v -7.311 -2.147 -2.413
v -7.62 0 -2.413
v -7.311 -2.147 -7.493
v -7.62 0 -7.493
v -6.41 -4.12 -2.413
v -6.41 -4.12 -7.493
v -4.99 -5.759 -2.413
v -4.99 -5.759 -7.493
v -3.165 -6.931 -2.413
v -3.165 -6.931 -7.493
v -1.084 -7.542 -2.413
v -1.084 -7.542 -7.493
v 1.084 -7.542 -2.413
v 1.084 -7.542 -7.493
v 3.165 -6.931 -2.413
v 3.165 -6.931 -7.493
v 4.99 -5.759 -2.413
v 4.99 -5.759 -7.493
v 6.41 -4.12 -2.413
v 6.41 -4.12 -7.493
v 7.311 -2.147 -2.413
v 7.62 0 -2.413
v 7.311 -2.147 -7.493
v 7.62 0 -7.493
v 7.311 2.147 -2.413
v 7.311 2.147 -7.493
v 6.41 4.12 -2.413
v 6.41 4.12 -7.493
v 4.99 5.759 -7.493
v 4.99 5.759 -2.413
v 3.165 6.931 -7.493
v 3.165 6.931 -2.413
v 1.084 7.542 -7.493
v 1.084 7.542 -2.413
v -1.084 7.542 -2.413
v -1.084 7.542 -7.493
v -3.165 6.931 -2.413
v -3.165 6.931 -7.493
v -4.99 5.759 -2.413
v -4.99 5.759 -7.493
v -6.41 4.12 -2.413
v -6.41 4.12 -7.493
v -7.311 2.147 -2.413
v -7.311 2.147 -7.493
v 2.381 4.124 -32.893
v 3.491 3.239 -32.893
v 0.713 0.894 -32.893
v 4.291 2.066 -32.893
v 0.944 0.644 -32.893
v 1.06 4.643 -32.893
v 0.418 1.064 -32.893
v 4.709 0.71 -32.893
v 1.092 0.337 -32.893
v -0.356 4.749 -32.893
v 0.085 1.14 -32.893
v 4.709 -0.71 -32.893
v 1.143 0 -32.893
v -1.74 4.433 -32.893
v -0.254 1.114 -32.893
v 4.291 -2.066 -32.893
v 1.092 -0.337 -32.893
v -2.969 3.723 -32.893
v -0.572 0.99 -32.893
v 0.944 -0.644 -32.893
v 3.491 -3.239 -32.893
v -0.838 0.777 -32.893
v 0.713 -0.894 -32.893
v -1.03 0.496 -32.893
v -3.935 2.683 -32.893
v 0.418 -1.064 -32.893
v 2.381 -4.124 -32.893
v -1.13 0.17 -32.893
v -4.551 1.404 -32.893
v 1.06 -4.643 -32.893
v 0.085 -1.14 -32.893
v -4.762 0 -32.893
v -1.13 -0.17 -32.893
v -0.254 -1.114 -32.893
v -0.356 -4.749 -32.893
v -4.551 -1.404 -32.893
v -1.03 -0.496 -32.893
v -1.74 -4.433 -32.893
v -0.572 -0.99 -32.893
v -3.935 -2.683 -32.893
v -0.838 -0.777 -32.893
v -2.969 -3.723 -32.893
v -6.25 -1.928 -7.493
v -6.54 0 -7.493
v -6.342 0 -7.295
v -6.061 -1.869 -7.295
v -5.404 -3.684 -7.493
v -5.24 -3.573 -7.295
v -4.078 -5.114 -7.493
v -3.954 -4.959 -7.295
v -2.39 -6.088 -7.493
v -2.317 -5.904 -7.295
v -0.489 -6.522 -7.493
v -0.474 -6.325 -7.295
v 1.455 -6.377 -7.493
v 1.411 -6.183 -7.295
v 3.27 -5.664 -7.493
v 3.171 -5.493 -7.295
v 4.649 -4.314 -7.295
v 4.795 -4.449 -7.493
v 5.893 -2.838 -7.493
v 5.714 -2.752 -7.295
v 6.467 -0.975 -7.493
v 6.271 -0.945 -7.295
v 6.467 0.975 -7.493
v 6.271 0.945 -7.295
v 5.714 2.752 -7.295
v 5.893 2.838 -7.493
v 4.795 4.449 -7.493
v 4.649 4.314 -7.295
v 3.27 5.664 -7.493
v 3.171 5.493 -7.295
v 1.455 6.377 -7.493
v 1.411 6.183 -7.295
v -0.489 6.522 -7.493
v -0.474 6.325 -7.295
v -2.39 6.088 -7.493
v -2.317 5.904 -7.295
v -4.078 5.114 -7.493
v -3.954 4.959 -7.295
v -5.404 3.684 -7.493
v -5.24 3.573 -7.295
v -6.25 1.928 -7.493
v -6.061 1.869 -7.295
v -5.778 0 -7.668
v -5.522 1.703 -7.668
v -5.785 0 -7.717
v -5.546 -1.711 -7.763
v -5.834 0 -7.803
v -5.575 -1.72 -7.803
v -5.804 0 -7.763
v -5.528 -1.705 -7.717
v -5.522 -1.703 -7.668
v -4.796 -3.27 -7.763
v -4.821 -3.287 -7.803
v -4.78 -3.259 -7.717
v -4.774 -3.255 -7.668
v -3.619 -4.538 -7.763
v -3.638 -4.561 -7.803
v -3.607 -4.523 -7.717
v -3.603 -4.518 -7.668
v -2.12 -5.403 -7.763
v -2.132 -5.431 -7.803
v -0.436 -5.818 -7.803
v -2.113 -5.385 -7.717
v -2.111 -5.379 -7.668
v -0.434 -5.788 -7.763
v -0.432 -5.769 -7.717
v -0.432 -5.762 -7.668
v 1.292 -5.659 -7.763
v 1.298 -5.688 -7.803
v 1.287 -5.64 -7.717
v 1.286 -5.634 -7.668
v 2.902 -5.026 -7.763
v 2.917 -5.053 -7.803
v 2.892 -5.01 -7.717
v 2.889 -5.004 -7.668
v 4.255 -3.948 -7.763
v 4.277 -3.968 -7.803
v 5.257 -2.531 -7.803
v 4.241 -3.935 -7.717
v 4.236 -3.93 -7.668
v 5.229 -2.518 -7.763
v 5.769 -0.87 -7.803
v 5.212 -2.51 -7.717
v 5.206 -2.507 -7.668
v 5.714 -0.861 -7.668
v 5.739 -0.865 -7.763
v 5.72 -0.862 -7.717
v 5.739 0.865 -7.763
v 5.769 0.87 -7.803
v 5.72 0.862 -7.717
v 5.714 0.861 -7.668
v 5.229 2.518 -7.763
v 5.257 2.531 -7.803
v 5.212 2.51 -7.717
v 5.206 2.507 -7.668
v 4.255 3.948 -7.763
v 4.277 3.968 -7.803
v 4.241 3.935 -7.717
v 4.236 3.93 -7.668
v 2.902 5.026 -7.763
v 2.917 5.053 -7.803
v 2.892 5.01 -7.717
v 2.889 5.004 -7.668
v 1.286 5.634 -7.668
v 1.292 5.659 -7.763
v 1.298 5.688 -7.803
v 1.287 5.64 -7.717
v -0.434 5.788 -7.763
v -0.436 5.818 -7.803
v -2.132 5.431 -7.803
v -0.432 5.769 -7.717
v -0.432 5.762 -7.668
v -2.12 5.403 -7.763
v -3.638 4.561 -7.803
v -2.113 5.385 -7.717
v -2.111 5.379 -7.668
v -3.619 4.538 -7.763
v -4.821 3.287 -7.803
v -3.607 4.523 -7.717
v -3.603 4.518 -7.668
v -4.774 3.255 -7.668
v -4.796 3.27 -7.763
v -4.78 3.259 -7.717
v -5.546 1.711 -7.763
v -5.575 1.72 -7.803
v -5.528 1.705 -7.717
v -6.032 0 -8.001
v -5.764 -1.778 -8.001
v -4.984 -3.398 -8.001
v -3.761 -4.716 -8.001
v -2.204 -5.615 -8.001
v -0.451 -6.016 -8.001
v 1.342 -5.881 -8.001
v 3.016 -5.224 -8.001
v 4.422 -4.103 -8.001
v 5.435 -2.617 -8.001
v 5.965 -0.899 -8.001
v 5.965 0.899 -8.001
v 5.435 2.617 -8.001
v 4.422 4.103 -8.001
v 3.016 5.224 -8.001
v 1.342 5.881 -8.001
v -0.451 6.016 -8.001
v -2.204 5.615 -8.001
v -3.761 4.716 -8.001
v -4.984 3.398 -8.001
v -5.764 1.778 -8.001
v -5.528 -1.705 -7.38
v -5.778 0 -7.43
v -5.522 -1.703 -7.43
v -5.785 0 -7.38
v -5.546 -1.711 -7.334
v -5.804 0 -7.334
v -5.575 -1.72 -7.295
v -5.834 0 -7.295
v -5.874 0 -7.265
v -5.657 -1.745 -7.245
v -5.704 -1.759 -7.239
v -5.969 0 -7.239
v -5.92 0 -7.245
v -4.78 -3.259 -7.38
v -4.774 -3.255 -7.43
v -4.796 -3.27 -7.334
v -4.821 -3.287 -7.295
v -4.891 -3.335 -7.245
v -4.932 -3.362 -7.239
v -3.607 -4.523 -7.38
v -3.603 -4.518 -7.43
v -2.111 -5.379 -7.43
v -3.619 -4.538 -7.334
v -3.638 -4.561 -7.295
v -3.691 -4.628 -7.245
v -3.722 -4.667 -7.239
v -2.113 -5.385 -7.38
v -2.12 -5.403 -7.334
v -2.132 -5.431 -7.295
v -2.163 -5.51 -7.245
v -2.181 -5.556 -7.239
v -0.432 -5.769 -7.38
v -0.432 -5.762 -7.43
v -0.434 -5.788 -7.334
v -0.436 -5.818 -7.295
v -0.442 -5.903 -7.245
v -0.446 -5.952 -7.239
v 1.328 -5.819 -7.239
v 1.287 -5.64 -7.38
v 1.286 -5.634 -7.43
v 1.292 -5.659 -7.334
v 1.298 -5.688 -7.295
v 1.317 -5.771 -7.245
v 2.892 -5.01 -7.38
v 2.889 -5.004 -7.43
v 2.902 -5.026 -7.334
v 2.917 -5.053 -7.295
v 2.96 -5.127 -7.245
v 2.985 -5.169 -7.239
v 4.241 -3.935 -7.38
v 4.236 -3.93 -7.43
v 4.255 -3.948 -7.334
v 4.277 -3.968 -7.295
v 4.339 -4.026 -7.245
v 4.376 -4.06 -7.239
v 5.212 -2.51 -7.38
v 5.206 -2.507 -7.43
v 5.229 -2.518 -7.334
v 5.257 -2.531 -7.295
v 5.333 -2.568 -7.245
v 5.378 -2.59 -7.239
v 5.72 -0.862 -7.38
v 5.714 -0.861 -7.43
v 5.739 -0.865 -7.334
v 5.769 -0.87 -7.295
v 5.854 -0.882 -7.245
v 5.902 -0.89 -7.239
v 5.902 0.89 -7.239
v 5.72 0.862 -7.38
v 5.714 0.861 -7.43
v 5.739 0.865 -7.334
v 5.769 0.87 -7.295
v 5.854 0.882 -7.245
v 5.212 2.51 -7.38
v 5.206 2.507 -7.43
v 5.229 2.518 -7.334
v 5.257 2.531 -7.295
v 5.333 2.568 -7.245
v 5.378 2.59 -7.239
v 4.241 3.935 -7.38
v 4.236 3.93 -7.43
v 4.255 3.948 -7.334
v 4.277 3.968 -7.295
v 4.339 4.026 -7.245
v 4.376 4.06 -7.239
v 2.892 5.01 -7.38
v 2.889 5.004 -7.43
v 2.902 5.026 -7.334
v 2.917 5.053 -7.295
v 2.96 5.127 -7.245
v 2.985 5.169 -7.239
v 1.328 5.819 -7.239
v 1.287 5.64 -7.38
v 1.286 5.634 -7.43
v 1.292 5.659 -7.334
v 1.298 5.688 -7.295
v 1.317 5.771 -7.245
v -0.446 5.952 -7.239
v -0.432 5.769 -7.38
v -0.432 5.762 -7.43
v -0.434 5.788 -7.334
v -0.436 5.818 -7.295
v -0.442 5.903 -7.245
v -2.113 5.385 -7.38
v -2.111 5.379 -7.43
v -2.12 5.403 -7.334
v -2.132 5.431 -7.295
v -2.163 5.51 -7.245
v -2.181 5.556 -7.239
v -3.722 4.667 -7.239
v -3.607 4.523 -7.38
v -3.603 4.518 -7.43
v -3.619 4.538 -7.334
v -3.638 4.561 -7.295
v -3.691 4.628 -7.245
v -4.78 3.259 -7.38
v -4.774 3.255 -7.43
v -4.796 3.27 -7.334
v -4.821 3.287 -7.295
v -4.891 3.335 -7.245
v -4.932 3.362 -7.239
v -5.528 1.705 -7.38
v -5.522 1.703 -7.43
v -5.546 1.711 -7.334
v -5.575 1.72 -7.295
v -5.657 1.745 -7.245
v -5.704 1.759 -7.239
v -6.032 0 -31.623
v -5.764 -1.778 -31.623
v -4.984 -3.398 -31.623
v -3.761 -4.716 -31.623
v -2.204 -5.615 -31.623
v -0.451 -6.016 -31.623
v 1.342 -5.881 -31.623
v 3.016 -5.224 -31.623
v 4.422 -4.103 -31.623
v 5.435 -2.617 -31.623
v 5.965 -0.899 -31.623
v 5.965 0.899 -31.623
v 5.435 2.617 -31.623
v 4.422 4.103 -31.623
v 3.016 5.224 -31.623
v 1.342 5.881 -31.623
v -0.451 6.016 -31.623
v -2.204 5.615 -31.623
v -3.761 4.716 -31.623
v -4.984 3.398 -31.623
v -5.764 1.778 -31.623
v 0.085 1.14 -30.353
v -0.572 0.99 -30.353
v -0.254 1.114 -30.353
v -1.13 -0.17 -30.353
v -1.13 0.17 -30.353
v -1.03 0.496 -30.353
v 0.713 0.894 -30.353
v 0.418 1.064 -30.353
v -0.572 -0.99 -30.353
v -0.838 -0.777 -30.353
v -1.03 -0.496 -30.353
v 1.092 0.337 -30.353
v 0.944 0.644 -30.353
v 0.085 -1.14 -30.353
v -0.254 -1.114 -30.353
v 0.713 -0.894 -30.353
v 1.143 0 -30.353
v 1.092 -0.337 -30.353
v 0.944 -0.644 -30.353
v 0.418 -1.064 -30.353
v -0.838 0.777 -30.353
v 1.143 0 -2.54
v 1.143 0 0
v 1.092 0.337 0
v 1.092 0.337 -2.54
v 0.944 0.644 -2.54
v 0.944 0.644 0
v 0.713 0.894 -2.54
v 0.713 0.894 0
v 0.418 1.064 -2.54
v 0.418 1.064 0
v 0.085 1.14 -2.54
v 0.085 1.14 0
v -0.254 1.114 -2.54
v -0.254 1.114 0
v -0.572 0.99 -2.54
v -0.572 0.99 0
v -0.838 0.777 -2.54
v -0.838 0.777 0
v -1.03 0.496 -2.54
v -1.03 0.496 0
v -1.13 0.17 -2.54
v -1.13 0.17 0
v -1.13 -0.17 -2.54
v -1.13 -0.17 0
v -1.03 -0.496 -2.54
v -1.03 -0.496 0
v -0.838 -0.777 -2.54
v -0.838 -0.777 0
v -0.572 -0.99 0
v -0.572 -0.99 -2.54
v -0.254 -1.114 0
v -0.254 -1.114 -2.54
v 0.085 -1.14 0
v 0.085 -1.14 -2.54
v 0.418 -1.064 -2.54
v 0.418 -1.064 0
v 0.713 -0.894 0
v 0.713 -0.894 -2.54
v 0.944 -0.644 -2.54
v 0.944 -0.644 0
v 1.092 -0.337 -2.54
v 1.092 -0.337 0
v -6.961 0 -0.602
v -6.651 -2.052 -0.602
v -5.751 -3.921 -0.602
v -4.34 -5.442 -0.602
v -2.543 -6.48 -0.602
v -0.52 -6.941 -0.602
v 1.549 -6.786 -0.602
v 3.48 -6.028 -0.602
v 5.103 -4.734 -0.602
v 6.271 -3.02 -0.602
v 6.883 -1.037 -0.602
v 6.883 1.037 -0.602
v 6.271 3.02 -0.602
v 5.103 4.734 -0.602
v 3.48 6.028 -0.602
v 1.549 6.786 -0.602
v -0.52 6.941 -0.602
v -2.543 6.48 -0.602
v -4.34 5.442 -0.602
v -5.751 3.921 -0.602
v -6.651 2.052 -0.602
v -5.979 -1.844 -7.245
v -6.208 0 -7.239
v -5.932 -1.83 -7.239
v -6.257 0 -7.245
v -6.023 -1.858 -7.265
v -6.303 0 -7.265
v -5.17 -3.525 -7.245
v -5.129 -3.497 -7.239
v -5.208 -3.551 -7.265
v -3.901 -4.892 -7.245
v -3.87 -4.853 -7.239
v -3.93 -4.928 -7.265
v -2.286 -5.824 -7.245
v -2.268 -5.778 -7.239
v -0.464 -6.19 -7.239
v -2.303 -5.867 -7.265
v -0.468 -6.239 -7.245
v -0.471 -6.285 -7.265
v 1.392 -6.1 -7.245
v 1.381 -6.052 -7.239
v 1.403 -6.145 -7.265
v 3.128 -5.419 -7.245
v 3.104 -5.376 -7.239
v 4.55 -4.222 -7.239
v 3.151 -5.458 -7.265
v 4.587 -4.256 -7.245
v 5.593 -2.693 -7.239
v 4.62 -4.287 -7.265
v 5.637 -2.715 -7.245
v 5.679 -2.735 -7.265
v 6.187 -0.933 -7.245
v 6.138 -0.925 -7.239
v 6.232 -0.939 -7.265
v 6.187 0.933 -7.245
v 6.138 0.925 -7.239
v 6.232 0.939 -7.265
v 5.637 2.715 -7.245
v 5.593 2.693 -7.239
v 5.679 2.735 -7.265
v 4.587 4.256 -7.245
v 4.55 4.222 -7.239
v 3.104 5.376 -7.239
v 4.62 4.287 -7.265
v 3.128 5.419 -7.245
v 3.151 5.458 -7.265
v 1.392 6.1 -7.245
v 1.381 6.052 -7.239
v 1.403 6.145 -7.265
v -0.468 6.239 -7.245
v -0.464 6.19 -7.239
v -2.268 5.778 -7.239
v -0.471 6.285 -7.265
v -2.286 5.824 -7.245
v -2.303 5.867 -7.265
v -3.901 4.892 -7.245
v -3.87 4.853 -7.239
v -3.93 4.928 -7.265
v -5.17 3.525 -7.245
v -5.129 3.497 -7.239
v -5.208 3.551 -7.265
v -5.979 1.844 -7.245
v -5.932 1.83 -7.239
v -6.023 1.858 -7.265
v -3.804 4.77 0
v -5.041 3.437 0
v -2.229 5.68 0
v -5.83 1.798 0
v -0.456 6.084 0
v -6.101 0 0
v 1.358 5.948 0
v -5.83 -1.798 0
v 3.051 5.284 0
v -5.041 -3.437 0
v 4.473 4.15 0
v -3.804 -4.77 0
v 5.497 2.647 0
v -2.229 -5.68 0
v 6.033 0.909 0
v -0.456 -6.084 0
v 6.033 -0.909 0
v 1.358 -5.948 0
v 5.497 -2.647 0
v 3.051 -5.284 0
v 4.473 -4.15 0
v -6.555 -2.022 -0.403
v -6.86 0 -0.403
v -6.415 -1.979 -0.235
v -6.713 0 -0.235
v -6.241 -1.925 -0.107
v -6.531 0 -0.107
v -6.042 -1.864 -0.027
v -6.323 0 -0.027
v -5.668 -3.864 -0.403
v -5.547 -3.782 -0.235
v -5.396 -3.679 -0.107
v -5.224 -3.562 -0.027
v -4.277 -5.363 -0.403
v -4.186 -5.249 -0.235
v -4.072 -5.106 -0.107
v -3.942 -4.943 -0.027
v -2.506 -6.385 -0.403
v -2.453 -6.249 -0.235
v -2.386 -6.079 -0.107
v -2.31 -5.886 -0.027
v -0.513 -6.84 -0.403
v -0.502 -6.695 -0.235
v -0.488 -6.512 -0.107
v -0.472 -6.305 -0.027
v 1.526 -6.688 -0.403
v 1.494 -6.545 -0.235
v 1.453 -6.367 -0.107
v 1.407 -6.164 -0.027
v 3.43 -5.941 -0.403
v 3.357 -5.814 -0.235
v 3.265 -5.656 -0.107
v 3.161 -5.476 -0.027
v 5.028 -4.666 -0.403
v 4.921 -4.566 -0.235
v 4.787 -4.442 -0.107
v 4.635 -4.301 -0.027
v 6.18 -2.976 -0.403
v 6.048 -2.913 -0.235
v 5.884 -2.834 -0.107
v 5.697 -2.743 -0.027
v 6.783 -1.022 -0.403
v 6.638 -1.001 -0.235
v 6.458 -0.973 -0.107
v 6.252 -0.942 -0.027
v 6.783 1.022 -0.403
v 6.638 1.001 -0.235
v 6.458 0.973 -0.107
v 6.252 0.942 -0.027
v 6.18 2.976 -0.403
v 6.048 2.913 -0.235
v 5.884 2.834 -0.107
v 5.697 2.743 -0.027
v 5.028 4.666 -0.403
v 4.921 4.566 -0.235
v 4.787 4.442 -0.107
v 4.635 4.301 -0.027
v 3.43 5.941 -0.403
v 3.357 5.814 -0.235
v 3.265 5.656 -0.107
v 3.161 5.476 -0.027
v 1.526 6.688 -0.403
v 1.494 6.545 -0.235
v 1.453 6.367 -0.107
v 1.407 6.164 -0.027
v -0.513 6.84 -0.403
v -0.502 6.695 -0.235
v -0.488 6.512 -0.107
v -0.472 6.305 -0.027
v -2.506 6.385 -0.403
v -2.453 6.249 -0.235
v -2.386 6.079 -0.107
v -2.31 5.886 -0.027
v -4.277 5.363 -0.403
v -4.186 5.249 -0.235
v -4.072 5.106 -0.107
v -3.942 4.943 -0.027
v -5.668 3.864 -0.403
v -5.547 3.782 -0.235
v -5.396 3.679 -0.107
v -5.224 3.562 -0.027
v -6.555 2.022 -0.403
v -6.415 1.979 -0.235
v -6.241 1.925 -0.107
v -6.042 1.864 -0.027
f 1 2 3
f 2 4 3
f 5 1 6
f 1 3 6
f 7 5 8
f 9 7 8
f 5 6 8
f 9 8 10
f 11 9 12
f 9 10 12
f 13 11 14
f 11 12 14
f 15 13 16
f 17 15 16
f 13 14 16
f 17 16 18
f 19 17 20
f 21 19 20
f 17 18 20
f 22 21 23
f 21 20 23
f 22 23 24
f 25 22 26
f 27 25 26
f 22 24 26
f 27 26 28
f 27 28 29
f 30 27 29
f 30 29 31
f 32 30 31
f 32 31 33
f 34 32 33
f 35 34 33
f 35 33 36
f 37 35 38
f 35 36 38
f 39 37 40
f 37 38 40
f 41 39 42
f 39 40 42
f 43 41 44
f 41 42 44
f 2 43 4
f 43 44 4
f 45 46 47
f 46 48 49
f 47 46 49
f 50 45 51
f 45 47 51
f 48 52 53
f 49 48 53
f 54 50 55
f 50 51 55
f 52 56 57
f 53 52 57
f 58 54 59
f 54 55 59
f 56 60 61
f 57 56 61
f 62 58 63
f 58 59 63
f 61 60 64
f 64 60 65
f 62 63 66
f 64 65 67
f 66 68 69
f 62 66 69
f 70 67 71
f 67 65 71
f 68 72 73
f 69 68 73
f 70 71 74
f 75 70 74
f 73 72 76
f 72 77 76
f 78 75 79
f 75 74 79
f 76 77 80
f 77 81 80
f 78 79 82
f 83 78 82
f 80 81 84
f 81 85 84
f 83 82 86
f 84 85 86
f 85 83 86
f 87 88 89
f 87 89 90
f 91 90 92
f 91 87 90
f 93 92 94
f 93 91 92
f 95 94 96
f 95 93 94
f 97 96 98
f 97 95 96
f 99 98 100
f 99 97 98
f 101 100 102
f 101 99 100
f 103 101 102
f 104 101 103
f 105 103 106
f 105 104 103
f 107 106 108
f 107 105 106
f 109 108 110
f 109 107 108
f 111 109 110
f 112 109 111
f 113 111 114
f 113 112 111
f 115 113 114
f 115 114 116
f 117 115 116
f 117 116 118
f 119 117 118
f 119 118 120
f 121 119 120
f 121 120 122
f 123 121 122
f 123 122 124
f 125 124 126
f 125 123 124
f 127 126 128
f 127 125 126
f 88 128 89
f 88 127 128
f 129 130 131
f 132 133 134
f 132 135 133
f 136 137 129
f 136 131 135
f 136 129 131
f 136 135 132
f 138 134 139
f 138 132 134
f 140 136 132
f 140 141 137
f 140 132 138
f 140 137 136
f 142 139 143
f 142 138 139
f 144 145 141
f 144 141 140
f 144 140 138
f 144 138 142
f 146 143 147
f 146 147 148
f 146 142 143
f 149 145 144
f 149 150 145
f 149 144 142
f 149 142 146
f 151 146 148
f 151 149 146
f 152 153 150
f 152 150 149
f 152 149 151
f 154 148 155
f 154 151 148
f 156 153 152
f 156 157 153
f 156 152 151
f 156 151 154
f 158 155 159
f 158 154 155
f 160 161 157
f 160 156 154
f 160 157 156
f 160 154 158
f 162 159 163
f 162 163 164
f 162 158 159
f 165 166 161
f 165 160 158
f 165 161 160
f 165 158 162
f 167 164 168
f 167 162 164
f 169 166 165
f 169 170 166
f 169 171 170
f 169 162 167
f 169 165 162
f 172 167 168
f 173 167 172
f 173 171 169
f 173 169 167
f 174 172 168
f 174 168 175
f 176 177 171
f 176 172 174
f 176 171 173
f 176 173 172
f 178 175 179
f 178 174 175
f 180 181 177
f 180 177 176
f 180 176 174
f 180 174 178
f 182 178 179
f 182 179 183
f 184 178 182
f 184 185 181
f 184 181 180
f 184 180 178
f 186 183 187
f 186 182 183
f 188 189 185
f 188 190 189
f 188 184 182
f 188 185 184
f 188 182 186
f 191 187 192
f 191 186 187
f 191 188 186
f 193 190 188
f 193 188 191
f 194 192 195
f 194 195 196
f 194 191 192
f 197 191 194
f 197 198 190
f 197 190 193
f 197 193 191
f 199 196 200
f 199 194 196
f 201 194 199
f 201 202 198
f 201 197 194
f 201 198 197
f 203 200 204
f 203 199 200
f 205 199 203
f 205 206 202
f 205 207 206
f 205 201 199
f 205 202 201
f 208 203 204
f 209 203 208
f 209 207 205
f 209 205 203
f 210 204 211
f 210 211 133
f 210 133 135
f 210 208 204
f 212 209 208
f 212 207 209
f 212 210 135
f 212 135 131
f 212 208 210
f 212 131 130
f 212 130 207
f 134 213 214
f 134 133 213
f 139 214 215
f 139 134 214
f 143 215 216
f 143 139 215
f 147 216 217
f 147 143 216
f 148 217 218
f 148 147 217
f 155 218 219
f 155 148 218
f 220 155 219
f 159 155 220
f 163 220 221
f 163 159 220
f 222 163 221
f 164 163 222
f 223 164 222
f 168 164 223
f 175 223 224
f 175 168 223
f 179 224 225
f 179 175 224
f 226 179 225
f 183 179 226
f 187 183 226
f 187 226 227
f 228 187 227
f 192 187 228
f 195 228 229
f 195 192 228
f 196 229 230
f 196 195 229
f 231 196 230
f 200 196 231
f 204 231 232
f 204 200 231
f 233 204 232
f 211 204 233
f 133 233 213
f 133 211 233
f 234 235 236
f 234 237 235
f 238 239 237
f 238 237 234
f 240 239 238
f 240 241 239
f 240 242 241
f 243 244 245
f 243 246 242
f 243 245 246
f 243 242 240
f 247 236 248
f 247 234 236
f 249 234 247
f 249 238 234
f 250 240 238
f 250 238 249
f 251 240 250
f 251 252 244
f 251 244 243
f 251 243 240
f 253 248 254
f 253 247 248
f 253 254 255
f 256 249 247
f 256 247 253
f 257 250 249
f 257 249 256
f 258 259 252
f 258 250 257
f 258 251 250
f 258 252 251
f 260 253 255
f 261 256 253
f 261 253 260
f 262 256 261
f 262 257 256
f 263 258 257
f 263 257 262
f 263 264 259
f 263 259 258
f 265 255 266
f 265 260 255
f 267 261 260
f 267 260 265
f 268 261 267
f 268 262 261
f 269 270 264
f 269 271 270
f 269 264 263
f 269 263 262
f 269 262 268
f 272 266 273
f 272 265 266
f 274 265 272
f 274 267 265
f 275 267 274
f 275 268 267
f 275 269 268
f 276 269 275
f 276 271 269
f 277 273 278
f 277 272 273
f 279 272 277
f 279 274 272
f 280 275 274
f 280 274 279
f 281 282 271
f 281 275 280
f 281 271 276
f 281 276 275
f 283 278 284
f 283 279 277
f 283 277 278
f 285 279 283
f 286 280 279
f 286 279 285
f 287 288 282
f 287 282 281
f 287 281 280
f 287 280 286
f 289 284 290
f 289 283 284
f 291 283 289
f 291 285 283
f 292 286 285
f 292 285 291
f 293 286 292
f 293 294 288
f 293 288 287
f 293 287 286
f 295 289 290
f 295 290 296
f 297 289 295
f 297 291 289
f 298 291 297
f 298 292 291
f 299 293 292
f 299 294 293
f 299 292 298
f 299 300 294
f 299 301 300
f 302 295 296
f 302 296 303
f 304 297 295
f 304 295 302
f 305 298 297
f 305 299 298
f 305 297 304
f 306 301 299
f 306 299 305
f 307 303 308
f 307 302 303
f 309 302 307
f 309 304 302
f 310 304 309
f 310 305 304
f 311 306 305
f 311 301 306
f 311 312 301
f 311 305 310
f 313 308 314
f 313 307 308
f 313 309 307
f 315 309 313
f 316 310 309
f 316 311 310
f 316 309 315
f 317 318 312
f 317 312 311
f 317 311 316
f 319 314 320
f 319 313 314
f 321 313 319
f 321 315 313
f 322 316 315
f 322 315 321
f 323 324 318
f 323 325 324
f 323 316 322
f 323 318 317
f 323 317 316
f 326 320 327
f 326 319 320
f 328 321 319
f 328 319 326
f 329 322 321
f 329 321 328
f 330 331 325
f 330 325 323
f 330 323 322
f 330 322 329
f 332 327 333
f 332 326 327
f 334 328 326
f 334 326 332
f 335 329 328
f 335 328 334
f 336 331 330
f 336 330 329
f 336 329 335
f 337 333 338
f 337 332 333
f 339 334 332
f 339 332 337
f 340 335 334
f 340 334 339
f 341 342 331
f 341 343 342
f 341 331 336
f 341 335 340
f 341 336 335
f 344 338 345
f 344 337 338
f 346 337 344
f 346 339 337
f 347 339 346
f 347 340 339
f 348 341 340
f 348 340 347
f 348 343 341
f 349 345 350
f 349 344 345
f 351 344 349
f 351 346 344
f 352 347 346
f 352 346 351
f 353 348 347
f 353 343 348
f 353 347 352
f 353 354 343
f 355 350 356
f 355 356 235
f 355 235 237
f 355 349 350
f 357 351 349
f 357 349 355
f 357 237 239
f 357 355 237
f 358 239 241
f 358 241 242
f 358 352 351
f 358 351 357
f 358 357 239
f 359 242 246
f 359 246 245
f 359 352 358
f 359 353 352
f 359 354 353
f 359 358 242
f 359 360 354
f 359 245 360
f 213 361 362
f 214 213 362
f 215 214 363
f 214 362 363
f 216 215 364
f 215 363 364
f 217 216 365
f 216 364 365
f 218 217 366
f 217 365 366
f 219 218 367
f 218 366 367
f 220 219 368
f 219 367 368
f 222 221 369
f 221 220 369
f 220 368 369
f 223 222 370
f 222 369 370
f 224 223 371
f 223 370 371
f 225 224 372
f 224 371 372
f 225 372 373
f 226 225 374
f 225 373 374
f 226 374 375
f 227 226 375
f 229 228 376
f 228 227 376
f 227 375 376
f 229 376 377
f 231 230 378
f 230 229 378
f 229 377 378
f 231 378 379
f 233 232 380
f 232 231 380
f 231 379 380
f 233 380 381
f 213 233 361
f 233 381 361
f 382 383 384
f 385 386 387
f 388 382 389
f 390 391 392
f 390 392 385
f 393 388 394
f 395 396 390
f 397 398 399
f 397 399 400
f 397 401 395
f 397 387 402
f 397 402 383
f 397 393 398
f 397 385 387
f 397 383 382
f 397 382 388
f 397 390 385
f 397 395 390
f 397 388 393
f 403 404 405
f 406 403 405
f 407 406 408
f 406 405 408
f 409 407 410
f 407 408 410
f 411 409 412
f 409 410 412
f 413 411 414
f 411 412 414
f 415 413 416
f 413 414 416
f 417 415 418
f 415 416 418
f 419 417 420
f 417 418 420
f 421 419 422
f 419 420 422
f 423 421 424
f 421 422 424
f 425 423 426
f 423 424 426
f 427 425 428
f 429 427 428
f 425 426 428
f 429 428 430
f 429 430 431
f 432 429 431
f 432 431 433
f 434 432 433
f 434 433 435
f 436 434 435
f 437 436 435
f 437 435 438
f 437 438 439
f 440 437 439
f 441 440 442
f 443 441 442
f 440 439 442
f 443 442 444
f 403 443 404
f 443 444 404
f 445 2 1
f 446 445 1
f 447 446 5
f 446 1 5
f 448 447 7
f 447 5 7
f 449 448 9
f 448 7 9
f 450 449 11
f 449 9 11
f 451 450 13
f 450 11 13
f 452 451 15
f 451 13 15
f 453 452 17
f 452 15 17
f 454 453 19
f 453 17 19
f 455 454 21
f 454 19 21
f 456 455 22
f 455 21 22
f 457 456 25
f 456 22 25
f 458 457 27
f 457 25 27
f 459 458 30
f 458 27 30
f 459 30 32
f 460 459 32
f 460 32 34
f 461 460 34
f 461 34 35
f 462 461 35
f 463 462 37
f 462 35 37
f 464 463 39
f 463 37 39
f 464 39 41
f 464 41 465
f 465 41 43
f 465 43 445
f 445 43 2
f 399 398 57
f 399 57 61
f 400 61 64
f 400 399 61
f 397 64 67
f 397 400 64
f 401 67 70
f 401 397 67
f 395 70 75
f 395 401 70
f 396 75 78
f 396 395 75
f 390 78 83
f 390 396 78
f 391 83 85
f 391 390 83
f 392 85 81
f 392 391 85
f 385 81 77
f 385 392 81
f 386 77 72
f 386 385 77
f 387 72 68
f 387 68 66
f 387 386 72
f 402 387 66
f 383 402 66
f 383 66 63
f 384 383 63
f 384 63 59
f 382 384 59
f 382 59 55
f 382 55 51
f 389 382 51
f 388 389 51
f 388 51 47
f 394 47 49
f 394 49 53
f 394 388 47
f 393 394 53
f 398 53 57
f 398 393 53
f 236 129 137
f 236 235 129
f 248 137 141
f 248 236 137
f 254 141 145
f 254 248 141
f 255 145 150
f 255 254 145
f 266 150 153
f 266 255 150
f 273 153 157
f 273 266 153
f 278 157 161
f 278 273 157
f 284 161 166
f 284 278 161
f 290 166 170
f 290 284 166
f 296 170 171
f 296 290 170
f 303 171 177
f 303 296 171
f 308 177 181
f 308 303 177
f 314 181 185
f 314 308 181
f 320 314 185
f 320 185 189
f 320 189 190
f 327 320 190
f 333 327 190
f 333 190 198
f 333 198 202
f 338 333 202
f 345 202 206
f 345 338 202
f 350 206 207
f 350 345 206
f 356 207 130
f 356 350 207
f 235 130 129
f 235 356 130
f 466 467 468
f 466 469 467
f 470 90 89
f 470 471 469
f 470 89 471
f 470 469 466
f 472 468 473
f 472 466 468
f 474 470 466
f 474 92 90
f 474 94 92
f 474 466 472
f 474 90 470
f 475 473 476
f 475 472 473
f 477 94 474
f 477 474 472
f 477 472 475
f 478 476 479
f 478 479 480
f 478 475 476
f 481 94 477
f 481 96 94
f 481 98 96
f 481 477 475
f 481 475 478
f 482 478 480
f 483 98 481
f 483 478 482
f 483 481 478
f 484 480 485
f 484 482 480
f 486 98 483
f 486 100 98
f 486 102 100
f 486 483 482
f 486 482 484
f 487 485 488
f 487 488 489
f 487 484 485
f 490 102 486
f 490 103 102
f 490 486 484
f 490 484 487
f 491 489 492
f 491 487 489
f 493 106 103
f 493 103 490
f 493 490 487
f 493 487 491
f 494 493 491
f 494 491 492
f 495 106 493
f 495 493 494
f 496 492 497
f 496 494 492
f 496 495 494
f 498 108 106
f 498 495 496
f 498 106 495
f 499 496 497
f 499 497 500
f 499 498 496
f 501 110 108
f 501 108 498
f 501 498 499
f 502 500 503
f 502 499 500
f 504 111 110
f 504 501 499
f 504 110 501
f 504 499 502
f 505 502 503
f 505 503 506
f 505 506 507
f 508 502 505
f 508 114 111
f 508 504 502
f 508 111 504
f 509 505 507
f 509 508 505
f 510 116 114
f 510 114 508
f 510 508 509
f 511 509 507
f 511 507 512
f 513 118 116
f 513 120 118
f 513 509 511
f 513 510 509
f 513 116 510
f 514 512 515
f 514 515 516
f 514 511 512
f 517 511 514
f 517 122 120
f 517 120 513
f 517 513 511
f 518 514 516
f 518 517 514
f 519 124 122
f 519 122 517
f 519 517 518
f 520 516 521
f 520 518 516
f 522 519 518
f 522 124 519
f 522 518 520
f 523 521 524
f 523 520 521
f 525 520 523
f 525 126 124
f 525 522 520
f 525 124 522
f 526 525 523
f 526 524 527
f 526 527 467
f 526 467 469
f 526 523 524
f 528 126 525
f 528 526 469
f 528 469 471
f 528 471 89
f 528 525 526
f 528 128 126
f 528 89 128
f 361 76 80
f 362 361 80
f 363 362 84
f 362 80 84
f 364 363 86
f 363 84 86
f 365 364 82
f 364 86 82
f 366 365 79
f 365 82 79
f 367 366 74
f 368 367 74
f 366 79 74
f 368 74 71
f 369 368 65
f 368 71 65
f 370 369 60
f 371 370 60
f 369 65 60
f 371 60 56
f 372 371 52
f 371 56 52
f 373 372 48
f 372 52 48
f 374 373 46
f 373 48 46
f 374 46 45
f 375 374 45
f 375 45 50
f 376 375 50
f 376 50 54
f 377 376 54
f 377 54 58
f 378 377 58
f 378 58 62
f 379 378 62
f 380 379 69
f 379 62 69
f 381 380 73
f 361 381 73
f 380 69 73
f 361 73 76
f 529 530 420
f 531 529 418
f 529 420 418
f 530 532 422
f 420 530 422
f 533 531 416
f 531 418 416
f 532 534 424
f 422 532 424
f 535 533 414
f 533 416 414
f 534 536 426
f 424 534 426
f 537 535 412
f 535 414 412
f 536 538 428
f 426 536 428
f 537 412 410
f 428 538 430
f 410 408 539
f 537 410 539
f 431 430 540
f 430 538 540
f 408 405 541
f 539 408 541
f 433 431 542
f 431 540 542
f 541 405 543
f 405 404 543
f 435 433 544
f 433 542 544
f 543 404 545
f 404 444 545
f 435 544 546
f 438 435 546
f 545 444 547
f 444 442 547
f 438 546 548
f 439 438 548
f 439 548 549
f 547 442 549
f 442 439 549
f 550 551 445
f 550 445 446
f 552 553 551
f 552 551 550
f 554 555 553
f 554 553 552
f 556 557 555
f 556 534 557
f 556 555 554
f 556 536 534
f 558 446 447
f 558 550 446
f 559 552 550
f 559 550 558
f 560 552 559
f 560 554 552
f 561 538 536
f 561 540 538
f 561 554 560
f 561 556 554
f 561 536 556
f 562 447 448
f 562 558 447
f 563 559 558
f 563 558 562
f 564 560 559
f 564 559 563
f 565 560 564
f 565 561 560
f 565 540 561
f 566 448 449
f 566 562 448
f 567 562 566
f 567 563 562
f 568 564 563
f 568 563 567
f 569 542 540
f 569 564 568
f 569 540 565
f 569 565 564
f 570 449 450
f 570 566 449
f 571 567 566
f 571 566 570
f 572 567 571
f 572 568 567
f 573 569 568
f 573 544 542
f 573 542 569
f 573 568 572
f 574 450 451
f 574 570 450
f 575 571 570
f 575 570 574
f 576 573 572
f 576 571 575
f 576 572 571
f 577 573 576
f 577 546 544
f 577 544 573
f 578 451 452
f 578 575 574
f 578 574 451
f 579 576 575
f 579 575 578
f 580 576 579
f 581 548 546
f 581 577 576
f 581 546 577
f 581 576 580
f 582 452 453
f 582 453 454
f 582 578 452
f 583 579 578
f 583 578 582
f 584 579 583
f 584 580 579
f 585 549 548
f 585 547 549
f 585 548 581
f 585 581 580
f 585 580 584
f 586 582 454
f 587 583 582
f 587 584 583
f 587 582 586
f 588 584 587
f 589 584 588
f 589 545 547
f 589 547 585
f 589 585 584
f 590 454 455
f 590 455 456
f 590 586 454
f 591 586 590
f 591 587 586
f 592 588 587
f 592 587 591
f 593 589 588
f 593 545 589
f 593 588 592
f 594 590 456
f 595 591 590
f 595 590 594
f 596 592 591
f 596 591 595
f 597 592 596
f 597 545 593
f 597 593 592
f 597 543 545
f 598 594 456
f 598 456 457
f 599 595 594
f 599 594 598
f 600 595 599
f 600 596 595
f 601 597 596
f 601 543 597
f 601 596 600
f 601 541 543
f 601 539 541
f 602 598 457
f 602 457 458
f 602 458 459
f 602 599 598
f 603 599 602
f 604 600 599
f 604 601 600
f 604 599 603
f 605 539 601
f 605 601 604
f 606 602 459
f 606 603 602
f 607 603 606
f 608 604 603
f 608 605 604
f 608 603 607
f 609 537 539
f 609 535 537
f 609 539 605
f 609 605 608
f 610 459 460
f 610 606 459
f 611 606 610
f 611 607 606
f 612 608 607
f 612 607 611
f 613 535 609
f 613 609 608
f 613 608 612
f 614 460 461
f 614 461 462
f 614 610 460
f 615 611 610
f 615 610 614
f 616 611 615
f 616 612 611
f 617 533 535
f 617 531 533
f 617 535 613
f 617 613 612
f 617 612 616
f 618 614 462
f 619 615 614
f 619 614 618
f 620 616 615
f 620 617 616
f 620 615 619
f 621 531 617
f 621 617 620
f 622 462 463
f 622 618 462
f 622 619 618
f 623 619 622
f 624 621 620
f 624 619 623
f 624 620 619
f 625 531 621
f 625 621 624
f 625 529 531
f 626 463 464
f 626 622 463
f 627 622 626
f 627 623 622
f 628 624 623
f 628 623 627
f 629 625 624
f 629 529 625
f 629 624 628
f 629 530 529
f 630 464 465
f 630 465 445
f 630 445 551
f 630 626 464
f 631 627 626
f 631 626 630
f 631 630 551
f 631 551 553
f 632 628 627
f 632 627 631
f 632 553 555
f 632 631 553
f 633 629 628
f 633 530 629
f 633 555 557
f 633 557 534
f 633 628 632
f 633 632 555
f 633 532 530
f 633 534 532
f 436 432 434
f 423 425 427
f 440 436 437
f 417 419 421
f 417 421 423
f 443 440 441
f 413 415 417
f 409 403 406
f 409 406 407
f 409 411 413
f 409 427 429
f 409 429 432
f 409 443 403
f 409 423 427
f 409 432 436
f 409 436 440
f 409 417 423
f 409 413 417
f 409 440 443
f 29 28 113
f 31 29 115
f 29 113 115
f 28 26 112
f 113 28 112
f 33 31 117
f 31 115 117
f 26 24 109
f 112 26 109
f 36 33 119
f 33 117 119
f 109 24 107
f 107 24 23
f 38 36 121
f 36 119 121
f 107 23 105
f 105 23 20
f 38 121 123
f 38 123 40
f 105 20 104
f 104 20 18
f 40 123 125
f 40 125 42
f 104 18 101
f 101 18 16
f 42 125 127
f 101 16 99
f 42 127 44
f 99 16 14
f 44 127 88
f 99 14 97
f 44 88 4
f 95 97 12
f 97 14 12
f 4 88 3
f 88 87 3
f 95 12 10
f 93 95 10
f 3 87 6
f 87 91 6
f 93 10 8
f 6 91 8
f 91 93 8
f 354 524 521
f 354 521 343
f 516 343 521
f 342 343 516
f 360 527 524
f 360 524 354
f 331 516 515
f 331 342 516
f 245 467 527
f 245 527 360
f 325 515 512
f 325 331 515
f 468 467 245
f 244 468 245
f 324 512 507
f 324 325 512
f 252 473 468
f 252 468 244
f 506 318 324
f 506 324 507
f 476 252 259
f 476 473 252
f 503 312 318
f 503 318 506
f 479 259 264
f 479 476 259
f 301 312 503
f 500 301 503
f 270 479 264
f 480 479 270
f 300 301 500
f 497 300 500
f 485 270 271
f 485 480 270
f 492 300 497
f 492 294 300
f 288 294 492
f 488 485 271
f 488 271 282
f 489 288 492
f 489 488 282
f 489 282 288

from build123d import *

# Parameters (mm, degrees)
CHAMFER1_SIZE      = 1.27
FILLET1_R          = 0.9144
SKETCH3_R          = 1.143
CUT_EXTRUDE1_DEPTH = 2.54
CUT_EXTRUDE2_START = -2.54
SKETCH4_R          = 1.143
CUT_EXTRUDE2_DEPTH = 2.54


with BuildPart() as part:
    # Sketch1 → Revolve1 (revolve)
    with BuildSketch(Plane(origin=(0, 0, 0), x_dir=(0, 0, -1), z_dir=(1, 0, 0)), mode=Mode.PRIVATE) as revolve1_sk:
        Polygon((0, 0), (0, 6.741739825), (2.413, 7.62), (7.493, 7.62), (7.493, 6.0325), (32.893, 6.0325), (32.893, 0), align=None)
    revolve(revolve1_sk.sketch.rotate(Axis((0, 0, -133.35), (0, 0, 1)), 90), axis=Axis((0, 0, -133.35), (0, 0, 1)))

    # Sketch2 → Cut-Revolve1 (revolve, cut)
    with BuildSketch(Plane(origin=(0, 0, 0), x_dir=(0, 0, -1), z_dir=(1, 0, 0)), mode=Mode.PRIVATE) as cut_revolve1_sk:
        with BuildLine():
            Line((7.294796158, 6.342296158), (7.747, 6.7945))
            Line((7.747, 6.7945), (8.255, 6.7945))
            Line((8.255, 6.7945), (8.255, 6.2865))
            Line((8.255, 6.2865), (7.802796158, 5.834296158))
            ThreePointArc((7.802796158, 5.834296158), (7.74099351, 5.793000949), (7.668092316, 5.7785))
            Line((7.668092316, 5.7785), (7.4295, 5.7785))
            ThreePointArc((7.4295, 5.7785), (7.294796158, 5.834296158), (7.239, 5.969))
            Line((7.239, 5.969), (7.239, 6.207592316))
            ThreePointArc((7.239, 6.207592316), (7.253500949, 6.28049351), (7.294796158, 6.342296158))
        make_face()
    revolve(cut_revolve1_sk.sketch.rotate(Axis((0, 0, -133.35), (0, 0, 1)), 90), axis=Axis((0, 0, -133.35), (0, 0, 1)), mode=Mode.SUBTRACT)

    # Chamfer1
    chamfer1_edges = [part.edges().sort_by_distance(p)[0] for p in [
        (6.0325, 0, -32.893),
    ]]
    chamfer(chamfer1_edges, length=CHAMFER1_SIZE)

    # Fillet1
    fillet1_edges = [part.edges().sort_by_distance(p)[0] for p in [
        (6.741739825, 0, 0),
    ]]
    fillet(fillet1_edges, radius=FILLET1_R)

    # Sketch3 → Cut-Extrude1 (cut)
    with BuildSketch(Plane.XY):
        Circle(SKETCH3_R)
    extrude(amount=-CUT_EXTRUDE1_DEPTH, mode=Mode.SUBTRACT)

    # Sketch4 → Cut-Extrude2 (cut)
    with BuildSketch(Plane(origin=(0, 0, -32.893), x_dir=(-1, 0, 0), z_dir=(0, 0, -1)).offset(CUT_EXTRUDE2_START)):
        with Locations(Location((0, 0, 0), (0, 0, 180))):
            Circle(SKETCH4_R)
    extrude(amount=CUT_EXTRUDE2_DEPTH, mode=Mode.SUBTRACT)


solid = part.part
